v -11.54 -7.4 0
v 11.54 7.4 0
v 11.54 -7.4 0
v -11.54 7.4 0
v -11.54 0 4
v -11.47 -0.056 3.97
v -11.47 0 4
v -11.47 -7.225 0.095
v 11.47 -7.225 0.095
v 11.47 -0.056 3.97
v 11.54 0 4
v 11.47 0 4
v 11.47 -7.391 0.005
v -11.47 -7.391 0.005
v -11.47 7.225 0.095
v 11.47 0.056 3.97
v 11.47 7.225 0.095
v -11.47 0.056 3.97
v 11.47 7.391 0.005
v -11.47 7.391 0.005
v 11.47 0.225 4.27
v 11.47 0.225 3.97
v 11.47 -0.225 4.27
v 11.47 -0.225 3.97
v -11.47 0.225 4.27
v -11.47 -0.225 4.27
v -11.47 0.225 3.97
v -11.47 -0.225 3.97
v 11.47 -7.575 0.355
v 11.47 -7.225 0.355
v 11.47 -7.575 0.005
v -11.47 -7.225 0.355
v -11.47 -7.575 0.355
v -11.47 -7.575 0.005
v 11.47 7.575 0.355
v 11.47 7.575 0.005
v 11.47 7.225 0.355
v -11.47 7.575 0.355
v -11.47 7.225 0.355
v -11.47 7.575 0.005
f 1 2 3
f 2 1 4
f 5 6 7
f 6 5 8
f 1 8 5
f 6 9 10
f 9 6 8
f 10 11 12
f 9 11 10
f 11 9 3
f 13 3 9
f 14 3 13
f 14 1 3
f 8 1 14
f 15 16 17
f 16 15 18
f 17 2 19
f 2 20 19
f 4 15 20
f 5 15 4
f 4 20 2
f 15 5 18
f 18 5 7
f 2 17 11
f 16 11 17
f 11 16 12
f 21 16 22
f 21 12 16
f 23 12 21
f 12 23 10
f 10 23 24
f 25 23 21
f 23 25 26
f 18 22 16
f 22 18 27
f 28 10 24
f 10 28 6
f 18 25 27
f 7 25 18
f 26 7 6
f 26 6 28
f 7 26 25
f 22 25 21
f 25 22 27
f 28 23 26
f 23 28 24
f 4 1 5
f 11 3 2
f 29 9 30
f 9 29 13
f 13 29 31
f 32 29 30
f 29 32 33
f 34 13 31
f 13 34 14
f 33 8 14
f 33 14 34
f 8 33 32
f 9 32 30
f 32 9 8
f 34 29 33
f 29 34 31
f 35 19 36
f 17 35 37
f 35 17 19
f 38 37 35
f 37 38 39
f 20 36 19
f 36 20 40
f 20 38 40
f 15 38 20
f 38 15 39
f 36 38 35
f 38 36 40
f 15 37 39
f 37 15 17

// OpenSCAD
// file: common.scad
// ============================================================
// Ancient Chinese City - shared parameters and primitive helpers
// ============================================================

function city_w() = 260;
function city_h() = 190;

function wall_t() = 14;
function wall_h() = 15;
function parapet_h() = 2.4;

function gate_w() = 28;

function main_road_w() = 9;
function side_road_w() = 5;

function c_ground()     = [0.60, 0.73, 0.48];
function c_road()       = [0.60, 0.54, 0.42];
function c_stone()      = [0.53, 0.50, 0.45];
function c_stone_dark() = [0.36, 0.34, 0.31];
function c_stone_lite() = [0.70, 0.66, 0.58];
function c_walkway()    = [0.64, 0.61, 0.54];

function c_wood()       = [0.42, 0.22, 0.10];
function c_wood_dark()  = [0.22, 0.11, 0.05];
function c_plaster()    = [0.84, 0.79, 0.67];

function c_roof()       = [0.55, 0.10, 0.06];
function c_roof_dark()  = [0.26, 0.06, 0.035];

function c_lantern()    = [0.86, 0.16, 0.08];
function c_flag()       = [0.72, 0.08, 0.06];
function c_green()      = [0.18, 0.42, 0.14];
function c_water()      = [0.28, 0.46, 0.60];

module boxc(s) {
    cube(s, center=true);
}

module stepped_base(L=20, D=16, H1=0.8, H2=0.5) {
    color(c_stone_dark())
    translate([0,0,H1/2])
    boxc([L,D,H1]);

    color(c_stone_lite())
    translate([0,0,H1+H2/2])
    boxc([L-1.4,D-1.4,H2]);
}

// Standalone preview.
stepped_base();
// main file
// ============================================================
// Ancient Chinese City - roof modules
// ============================================================

$fn = 32;

use <common.scad>

module gable_end_trim(xpos, D=12, H=4, over=1.4, t=0.28) {
    y0 = -(D/2 + over);
    y1 =  (D/2 + over);

    color(c_roof_dark())
    polyhedron(
        points = [
            [xpos - t/2, y0, 0],
            [xpos - t/2, y1, 0],
            [xpos - t/2, 0,  H],

            [xpos + t/2, y0, 0],
            [xpos + t/2, y1, 0],
            [xpos + t/2, 0,  H]
        ],
        faces = [
            [0,1,2],
            [3,5,4],
            [0,3,4,1],
            [1,4,5,2],
            [2,5,3,0]
        ]
    );
}

module gable_roof(L=20, D=12, H=4, over=1.4) {
    color(c_roof())
    polyhedron(
        points = [
            [-(L/2+over), -(D/2+over), 0],
            [ (L/2+over), -(D/2+over), 0],
            [ (L/2+over),  (D/2+over), 0],
            [-(L/2+over),  (D/2+over), 0],
            [-(L/2+over),  0,          H],
            [ (L/2+over),  0,          H]
        ],
        faces = [
            [0,1,2,3],
            [0,4,5,1],
            [3,2,5,4],
            [0,3,4],
            [1,5,2]
        ]
    );

    color(c_roof_dark())
    translate([0,0,H+0.12])
    boxc([L + over*2.1, 0.45, 0.30]);

    gable_end_trim(-(L/2+over), D, H, over);
    gable_end_trim( (L/2+over), D, H, over);

    color(c_roof_dark())
    translate([0, -(D/2+over), 0.18])
    boxc([L + over*2.1, 0.35, 0.35]);

    color(c_roof_dark())
    translate([0,  (D/2+over), 0.18])
    boxc([L + over*2.1, 0.35, 0.35]);
}

// Standalone preview.
gable_roof();
